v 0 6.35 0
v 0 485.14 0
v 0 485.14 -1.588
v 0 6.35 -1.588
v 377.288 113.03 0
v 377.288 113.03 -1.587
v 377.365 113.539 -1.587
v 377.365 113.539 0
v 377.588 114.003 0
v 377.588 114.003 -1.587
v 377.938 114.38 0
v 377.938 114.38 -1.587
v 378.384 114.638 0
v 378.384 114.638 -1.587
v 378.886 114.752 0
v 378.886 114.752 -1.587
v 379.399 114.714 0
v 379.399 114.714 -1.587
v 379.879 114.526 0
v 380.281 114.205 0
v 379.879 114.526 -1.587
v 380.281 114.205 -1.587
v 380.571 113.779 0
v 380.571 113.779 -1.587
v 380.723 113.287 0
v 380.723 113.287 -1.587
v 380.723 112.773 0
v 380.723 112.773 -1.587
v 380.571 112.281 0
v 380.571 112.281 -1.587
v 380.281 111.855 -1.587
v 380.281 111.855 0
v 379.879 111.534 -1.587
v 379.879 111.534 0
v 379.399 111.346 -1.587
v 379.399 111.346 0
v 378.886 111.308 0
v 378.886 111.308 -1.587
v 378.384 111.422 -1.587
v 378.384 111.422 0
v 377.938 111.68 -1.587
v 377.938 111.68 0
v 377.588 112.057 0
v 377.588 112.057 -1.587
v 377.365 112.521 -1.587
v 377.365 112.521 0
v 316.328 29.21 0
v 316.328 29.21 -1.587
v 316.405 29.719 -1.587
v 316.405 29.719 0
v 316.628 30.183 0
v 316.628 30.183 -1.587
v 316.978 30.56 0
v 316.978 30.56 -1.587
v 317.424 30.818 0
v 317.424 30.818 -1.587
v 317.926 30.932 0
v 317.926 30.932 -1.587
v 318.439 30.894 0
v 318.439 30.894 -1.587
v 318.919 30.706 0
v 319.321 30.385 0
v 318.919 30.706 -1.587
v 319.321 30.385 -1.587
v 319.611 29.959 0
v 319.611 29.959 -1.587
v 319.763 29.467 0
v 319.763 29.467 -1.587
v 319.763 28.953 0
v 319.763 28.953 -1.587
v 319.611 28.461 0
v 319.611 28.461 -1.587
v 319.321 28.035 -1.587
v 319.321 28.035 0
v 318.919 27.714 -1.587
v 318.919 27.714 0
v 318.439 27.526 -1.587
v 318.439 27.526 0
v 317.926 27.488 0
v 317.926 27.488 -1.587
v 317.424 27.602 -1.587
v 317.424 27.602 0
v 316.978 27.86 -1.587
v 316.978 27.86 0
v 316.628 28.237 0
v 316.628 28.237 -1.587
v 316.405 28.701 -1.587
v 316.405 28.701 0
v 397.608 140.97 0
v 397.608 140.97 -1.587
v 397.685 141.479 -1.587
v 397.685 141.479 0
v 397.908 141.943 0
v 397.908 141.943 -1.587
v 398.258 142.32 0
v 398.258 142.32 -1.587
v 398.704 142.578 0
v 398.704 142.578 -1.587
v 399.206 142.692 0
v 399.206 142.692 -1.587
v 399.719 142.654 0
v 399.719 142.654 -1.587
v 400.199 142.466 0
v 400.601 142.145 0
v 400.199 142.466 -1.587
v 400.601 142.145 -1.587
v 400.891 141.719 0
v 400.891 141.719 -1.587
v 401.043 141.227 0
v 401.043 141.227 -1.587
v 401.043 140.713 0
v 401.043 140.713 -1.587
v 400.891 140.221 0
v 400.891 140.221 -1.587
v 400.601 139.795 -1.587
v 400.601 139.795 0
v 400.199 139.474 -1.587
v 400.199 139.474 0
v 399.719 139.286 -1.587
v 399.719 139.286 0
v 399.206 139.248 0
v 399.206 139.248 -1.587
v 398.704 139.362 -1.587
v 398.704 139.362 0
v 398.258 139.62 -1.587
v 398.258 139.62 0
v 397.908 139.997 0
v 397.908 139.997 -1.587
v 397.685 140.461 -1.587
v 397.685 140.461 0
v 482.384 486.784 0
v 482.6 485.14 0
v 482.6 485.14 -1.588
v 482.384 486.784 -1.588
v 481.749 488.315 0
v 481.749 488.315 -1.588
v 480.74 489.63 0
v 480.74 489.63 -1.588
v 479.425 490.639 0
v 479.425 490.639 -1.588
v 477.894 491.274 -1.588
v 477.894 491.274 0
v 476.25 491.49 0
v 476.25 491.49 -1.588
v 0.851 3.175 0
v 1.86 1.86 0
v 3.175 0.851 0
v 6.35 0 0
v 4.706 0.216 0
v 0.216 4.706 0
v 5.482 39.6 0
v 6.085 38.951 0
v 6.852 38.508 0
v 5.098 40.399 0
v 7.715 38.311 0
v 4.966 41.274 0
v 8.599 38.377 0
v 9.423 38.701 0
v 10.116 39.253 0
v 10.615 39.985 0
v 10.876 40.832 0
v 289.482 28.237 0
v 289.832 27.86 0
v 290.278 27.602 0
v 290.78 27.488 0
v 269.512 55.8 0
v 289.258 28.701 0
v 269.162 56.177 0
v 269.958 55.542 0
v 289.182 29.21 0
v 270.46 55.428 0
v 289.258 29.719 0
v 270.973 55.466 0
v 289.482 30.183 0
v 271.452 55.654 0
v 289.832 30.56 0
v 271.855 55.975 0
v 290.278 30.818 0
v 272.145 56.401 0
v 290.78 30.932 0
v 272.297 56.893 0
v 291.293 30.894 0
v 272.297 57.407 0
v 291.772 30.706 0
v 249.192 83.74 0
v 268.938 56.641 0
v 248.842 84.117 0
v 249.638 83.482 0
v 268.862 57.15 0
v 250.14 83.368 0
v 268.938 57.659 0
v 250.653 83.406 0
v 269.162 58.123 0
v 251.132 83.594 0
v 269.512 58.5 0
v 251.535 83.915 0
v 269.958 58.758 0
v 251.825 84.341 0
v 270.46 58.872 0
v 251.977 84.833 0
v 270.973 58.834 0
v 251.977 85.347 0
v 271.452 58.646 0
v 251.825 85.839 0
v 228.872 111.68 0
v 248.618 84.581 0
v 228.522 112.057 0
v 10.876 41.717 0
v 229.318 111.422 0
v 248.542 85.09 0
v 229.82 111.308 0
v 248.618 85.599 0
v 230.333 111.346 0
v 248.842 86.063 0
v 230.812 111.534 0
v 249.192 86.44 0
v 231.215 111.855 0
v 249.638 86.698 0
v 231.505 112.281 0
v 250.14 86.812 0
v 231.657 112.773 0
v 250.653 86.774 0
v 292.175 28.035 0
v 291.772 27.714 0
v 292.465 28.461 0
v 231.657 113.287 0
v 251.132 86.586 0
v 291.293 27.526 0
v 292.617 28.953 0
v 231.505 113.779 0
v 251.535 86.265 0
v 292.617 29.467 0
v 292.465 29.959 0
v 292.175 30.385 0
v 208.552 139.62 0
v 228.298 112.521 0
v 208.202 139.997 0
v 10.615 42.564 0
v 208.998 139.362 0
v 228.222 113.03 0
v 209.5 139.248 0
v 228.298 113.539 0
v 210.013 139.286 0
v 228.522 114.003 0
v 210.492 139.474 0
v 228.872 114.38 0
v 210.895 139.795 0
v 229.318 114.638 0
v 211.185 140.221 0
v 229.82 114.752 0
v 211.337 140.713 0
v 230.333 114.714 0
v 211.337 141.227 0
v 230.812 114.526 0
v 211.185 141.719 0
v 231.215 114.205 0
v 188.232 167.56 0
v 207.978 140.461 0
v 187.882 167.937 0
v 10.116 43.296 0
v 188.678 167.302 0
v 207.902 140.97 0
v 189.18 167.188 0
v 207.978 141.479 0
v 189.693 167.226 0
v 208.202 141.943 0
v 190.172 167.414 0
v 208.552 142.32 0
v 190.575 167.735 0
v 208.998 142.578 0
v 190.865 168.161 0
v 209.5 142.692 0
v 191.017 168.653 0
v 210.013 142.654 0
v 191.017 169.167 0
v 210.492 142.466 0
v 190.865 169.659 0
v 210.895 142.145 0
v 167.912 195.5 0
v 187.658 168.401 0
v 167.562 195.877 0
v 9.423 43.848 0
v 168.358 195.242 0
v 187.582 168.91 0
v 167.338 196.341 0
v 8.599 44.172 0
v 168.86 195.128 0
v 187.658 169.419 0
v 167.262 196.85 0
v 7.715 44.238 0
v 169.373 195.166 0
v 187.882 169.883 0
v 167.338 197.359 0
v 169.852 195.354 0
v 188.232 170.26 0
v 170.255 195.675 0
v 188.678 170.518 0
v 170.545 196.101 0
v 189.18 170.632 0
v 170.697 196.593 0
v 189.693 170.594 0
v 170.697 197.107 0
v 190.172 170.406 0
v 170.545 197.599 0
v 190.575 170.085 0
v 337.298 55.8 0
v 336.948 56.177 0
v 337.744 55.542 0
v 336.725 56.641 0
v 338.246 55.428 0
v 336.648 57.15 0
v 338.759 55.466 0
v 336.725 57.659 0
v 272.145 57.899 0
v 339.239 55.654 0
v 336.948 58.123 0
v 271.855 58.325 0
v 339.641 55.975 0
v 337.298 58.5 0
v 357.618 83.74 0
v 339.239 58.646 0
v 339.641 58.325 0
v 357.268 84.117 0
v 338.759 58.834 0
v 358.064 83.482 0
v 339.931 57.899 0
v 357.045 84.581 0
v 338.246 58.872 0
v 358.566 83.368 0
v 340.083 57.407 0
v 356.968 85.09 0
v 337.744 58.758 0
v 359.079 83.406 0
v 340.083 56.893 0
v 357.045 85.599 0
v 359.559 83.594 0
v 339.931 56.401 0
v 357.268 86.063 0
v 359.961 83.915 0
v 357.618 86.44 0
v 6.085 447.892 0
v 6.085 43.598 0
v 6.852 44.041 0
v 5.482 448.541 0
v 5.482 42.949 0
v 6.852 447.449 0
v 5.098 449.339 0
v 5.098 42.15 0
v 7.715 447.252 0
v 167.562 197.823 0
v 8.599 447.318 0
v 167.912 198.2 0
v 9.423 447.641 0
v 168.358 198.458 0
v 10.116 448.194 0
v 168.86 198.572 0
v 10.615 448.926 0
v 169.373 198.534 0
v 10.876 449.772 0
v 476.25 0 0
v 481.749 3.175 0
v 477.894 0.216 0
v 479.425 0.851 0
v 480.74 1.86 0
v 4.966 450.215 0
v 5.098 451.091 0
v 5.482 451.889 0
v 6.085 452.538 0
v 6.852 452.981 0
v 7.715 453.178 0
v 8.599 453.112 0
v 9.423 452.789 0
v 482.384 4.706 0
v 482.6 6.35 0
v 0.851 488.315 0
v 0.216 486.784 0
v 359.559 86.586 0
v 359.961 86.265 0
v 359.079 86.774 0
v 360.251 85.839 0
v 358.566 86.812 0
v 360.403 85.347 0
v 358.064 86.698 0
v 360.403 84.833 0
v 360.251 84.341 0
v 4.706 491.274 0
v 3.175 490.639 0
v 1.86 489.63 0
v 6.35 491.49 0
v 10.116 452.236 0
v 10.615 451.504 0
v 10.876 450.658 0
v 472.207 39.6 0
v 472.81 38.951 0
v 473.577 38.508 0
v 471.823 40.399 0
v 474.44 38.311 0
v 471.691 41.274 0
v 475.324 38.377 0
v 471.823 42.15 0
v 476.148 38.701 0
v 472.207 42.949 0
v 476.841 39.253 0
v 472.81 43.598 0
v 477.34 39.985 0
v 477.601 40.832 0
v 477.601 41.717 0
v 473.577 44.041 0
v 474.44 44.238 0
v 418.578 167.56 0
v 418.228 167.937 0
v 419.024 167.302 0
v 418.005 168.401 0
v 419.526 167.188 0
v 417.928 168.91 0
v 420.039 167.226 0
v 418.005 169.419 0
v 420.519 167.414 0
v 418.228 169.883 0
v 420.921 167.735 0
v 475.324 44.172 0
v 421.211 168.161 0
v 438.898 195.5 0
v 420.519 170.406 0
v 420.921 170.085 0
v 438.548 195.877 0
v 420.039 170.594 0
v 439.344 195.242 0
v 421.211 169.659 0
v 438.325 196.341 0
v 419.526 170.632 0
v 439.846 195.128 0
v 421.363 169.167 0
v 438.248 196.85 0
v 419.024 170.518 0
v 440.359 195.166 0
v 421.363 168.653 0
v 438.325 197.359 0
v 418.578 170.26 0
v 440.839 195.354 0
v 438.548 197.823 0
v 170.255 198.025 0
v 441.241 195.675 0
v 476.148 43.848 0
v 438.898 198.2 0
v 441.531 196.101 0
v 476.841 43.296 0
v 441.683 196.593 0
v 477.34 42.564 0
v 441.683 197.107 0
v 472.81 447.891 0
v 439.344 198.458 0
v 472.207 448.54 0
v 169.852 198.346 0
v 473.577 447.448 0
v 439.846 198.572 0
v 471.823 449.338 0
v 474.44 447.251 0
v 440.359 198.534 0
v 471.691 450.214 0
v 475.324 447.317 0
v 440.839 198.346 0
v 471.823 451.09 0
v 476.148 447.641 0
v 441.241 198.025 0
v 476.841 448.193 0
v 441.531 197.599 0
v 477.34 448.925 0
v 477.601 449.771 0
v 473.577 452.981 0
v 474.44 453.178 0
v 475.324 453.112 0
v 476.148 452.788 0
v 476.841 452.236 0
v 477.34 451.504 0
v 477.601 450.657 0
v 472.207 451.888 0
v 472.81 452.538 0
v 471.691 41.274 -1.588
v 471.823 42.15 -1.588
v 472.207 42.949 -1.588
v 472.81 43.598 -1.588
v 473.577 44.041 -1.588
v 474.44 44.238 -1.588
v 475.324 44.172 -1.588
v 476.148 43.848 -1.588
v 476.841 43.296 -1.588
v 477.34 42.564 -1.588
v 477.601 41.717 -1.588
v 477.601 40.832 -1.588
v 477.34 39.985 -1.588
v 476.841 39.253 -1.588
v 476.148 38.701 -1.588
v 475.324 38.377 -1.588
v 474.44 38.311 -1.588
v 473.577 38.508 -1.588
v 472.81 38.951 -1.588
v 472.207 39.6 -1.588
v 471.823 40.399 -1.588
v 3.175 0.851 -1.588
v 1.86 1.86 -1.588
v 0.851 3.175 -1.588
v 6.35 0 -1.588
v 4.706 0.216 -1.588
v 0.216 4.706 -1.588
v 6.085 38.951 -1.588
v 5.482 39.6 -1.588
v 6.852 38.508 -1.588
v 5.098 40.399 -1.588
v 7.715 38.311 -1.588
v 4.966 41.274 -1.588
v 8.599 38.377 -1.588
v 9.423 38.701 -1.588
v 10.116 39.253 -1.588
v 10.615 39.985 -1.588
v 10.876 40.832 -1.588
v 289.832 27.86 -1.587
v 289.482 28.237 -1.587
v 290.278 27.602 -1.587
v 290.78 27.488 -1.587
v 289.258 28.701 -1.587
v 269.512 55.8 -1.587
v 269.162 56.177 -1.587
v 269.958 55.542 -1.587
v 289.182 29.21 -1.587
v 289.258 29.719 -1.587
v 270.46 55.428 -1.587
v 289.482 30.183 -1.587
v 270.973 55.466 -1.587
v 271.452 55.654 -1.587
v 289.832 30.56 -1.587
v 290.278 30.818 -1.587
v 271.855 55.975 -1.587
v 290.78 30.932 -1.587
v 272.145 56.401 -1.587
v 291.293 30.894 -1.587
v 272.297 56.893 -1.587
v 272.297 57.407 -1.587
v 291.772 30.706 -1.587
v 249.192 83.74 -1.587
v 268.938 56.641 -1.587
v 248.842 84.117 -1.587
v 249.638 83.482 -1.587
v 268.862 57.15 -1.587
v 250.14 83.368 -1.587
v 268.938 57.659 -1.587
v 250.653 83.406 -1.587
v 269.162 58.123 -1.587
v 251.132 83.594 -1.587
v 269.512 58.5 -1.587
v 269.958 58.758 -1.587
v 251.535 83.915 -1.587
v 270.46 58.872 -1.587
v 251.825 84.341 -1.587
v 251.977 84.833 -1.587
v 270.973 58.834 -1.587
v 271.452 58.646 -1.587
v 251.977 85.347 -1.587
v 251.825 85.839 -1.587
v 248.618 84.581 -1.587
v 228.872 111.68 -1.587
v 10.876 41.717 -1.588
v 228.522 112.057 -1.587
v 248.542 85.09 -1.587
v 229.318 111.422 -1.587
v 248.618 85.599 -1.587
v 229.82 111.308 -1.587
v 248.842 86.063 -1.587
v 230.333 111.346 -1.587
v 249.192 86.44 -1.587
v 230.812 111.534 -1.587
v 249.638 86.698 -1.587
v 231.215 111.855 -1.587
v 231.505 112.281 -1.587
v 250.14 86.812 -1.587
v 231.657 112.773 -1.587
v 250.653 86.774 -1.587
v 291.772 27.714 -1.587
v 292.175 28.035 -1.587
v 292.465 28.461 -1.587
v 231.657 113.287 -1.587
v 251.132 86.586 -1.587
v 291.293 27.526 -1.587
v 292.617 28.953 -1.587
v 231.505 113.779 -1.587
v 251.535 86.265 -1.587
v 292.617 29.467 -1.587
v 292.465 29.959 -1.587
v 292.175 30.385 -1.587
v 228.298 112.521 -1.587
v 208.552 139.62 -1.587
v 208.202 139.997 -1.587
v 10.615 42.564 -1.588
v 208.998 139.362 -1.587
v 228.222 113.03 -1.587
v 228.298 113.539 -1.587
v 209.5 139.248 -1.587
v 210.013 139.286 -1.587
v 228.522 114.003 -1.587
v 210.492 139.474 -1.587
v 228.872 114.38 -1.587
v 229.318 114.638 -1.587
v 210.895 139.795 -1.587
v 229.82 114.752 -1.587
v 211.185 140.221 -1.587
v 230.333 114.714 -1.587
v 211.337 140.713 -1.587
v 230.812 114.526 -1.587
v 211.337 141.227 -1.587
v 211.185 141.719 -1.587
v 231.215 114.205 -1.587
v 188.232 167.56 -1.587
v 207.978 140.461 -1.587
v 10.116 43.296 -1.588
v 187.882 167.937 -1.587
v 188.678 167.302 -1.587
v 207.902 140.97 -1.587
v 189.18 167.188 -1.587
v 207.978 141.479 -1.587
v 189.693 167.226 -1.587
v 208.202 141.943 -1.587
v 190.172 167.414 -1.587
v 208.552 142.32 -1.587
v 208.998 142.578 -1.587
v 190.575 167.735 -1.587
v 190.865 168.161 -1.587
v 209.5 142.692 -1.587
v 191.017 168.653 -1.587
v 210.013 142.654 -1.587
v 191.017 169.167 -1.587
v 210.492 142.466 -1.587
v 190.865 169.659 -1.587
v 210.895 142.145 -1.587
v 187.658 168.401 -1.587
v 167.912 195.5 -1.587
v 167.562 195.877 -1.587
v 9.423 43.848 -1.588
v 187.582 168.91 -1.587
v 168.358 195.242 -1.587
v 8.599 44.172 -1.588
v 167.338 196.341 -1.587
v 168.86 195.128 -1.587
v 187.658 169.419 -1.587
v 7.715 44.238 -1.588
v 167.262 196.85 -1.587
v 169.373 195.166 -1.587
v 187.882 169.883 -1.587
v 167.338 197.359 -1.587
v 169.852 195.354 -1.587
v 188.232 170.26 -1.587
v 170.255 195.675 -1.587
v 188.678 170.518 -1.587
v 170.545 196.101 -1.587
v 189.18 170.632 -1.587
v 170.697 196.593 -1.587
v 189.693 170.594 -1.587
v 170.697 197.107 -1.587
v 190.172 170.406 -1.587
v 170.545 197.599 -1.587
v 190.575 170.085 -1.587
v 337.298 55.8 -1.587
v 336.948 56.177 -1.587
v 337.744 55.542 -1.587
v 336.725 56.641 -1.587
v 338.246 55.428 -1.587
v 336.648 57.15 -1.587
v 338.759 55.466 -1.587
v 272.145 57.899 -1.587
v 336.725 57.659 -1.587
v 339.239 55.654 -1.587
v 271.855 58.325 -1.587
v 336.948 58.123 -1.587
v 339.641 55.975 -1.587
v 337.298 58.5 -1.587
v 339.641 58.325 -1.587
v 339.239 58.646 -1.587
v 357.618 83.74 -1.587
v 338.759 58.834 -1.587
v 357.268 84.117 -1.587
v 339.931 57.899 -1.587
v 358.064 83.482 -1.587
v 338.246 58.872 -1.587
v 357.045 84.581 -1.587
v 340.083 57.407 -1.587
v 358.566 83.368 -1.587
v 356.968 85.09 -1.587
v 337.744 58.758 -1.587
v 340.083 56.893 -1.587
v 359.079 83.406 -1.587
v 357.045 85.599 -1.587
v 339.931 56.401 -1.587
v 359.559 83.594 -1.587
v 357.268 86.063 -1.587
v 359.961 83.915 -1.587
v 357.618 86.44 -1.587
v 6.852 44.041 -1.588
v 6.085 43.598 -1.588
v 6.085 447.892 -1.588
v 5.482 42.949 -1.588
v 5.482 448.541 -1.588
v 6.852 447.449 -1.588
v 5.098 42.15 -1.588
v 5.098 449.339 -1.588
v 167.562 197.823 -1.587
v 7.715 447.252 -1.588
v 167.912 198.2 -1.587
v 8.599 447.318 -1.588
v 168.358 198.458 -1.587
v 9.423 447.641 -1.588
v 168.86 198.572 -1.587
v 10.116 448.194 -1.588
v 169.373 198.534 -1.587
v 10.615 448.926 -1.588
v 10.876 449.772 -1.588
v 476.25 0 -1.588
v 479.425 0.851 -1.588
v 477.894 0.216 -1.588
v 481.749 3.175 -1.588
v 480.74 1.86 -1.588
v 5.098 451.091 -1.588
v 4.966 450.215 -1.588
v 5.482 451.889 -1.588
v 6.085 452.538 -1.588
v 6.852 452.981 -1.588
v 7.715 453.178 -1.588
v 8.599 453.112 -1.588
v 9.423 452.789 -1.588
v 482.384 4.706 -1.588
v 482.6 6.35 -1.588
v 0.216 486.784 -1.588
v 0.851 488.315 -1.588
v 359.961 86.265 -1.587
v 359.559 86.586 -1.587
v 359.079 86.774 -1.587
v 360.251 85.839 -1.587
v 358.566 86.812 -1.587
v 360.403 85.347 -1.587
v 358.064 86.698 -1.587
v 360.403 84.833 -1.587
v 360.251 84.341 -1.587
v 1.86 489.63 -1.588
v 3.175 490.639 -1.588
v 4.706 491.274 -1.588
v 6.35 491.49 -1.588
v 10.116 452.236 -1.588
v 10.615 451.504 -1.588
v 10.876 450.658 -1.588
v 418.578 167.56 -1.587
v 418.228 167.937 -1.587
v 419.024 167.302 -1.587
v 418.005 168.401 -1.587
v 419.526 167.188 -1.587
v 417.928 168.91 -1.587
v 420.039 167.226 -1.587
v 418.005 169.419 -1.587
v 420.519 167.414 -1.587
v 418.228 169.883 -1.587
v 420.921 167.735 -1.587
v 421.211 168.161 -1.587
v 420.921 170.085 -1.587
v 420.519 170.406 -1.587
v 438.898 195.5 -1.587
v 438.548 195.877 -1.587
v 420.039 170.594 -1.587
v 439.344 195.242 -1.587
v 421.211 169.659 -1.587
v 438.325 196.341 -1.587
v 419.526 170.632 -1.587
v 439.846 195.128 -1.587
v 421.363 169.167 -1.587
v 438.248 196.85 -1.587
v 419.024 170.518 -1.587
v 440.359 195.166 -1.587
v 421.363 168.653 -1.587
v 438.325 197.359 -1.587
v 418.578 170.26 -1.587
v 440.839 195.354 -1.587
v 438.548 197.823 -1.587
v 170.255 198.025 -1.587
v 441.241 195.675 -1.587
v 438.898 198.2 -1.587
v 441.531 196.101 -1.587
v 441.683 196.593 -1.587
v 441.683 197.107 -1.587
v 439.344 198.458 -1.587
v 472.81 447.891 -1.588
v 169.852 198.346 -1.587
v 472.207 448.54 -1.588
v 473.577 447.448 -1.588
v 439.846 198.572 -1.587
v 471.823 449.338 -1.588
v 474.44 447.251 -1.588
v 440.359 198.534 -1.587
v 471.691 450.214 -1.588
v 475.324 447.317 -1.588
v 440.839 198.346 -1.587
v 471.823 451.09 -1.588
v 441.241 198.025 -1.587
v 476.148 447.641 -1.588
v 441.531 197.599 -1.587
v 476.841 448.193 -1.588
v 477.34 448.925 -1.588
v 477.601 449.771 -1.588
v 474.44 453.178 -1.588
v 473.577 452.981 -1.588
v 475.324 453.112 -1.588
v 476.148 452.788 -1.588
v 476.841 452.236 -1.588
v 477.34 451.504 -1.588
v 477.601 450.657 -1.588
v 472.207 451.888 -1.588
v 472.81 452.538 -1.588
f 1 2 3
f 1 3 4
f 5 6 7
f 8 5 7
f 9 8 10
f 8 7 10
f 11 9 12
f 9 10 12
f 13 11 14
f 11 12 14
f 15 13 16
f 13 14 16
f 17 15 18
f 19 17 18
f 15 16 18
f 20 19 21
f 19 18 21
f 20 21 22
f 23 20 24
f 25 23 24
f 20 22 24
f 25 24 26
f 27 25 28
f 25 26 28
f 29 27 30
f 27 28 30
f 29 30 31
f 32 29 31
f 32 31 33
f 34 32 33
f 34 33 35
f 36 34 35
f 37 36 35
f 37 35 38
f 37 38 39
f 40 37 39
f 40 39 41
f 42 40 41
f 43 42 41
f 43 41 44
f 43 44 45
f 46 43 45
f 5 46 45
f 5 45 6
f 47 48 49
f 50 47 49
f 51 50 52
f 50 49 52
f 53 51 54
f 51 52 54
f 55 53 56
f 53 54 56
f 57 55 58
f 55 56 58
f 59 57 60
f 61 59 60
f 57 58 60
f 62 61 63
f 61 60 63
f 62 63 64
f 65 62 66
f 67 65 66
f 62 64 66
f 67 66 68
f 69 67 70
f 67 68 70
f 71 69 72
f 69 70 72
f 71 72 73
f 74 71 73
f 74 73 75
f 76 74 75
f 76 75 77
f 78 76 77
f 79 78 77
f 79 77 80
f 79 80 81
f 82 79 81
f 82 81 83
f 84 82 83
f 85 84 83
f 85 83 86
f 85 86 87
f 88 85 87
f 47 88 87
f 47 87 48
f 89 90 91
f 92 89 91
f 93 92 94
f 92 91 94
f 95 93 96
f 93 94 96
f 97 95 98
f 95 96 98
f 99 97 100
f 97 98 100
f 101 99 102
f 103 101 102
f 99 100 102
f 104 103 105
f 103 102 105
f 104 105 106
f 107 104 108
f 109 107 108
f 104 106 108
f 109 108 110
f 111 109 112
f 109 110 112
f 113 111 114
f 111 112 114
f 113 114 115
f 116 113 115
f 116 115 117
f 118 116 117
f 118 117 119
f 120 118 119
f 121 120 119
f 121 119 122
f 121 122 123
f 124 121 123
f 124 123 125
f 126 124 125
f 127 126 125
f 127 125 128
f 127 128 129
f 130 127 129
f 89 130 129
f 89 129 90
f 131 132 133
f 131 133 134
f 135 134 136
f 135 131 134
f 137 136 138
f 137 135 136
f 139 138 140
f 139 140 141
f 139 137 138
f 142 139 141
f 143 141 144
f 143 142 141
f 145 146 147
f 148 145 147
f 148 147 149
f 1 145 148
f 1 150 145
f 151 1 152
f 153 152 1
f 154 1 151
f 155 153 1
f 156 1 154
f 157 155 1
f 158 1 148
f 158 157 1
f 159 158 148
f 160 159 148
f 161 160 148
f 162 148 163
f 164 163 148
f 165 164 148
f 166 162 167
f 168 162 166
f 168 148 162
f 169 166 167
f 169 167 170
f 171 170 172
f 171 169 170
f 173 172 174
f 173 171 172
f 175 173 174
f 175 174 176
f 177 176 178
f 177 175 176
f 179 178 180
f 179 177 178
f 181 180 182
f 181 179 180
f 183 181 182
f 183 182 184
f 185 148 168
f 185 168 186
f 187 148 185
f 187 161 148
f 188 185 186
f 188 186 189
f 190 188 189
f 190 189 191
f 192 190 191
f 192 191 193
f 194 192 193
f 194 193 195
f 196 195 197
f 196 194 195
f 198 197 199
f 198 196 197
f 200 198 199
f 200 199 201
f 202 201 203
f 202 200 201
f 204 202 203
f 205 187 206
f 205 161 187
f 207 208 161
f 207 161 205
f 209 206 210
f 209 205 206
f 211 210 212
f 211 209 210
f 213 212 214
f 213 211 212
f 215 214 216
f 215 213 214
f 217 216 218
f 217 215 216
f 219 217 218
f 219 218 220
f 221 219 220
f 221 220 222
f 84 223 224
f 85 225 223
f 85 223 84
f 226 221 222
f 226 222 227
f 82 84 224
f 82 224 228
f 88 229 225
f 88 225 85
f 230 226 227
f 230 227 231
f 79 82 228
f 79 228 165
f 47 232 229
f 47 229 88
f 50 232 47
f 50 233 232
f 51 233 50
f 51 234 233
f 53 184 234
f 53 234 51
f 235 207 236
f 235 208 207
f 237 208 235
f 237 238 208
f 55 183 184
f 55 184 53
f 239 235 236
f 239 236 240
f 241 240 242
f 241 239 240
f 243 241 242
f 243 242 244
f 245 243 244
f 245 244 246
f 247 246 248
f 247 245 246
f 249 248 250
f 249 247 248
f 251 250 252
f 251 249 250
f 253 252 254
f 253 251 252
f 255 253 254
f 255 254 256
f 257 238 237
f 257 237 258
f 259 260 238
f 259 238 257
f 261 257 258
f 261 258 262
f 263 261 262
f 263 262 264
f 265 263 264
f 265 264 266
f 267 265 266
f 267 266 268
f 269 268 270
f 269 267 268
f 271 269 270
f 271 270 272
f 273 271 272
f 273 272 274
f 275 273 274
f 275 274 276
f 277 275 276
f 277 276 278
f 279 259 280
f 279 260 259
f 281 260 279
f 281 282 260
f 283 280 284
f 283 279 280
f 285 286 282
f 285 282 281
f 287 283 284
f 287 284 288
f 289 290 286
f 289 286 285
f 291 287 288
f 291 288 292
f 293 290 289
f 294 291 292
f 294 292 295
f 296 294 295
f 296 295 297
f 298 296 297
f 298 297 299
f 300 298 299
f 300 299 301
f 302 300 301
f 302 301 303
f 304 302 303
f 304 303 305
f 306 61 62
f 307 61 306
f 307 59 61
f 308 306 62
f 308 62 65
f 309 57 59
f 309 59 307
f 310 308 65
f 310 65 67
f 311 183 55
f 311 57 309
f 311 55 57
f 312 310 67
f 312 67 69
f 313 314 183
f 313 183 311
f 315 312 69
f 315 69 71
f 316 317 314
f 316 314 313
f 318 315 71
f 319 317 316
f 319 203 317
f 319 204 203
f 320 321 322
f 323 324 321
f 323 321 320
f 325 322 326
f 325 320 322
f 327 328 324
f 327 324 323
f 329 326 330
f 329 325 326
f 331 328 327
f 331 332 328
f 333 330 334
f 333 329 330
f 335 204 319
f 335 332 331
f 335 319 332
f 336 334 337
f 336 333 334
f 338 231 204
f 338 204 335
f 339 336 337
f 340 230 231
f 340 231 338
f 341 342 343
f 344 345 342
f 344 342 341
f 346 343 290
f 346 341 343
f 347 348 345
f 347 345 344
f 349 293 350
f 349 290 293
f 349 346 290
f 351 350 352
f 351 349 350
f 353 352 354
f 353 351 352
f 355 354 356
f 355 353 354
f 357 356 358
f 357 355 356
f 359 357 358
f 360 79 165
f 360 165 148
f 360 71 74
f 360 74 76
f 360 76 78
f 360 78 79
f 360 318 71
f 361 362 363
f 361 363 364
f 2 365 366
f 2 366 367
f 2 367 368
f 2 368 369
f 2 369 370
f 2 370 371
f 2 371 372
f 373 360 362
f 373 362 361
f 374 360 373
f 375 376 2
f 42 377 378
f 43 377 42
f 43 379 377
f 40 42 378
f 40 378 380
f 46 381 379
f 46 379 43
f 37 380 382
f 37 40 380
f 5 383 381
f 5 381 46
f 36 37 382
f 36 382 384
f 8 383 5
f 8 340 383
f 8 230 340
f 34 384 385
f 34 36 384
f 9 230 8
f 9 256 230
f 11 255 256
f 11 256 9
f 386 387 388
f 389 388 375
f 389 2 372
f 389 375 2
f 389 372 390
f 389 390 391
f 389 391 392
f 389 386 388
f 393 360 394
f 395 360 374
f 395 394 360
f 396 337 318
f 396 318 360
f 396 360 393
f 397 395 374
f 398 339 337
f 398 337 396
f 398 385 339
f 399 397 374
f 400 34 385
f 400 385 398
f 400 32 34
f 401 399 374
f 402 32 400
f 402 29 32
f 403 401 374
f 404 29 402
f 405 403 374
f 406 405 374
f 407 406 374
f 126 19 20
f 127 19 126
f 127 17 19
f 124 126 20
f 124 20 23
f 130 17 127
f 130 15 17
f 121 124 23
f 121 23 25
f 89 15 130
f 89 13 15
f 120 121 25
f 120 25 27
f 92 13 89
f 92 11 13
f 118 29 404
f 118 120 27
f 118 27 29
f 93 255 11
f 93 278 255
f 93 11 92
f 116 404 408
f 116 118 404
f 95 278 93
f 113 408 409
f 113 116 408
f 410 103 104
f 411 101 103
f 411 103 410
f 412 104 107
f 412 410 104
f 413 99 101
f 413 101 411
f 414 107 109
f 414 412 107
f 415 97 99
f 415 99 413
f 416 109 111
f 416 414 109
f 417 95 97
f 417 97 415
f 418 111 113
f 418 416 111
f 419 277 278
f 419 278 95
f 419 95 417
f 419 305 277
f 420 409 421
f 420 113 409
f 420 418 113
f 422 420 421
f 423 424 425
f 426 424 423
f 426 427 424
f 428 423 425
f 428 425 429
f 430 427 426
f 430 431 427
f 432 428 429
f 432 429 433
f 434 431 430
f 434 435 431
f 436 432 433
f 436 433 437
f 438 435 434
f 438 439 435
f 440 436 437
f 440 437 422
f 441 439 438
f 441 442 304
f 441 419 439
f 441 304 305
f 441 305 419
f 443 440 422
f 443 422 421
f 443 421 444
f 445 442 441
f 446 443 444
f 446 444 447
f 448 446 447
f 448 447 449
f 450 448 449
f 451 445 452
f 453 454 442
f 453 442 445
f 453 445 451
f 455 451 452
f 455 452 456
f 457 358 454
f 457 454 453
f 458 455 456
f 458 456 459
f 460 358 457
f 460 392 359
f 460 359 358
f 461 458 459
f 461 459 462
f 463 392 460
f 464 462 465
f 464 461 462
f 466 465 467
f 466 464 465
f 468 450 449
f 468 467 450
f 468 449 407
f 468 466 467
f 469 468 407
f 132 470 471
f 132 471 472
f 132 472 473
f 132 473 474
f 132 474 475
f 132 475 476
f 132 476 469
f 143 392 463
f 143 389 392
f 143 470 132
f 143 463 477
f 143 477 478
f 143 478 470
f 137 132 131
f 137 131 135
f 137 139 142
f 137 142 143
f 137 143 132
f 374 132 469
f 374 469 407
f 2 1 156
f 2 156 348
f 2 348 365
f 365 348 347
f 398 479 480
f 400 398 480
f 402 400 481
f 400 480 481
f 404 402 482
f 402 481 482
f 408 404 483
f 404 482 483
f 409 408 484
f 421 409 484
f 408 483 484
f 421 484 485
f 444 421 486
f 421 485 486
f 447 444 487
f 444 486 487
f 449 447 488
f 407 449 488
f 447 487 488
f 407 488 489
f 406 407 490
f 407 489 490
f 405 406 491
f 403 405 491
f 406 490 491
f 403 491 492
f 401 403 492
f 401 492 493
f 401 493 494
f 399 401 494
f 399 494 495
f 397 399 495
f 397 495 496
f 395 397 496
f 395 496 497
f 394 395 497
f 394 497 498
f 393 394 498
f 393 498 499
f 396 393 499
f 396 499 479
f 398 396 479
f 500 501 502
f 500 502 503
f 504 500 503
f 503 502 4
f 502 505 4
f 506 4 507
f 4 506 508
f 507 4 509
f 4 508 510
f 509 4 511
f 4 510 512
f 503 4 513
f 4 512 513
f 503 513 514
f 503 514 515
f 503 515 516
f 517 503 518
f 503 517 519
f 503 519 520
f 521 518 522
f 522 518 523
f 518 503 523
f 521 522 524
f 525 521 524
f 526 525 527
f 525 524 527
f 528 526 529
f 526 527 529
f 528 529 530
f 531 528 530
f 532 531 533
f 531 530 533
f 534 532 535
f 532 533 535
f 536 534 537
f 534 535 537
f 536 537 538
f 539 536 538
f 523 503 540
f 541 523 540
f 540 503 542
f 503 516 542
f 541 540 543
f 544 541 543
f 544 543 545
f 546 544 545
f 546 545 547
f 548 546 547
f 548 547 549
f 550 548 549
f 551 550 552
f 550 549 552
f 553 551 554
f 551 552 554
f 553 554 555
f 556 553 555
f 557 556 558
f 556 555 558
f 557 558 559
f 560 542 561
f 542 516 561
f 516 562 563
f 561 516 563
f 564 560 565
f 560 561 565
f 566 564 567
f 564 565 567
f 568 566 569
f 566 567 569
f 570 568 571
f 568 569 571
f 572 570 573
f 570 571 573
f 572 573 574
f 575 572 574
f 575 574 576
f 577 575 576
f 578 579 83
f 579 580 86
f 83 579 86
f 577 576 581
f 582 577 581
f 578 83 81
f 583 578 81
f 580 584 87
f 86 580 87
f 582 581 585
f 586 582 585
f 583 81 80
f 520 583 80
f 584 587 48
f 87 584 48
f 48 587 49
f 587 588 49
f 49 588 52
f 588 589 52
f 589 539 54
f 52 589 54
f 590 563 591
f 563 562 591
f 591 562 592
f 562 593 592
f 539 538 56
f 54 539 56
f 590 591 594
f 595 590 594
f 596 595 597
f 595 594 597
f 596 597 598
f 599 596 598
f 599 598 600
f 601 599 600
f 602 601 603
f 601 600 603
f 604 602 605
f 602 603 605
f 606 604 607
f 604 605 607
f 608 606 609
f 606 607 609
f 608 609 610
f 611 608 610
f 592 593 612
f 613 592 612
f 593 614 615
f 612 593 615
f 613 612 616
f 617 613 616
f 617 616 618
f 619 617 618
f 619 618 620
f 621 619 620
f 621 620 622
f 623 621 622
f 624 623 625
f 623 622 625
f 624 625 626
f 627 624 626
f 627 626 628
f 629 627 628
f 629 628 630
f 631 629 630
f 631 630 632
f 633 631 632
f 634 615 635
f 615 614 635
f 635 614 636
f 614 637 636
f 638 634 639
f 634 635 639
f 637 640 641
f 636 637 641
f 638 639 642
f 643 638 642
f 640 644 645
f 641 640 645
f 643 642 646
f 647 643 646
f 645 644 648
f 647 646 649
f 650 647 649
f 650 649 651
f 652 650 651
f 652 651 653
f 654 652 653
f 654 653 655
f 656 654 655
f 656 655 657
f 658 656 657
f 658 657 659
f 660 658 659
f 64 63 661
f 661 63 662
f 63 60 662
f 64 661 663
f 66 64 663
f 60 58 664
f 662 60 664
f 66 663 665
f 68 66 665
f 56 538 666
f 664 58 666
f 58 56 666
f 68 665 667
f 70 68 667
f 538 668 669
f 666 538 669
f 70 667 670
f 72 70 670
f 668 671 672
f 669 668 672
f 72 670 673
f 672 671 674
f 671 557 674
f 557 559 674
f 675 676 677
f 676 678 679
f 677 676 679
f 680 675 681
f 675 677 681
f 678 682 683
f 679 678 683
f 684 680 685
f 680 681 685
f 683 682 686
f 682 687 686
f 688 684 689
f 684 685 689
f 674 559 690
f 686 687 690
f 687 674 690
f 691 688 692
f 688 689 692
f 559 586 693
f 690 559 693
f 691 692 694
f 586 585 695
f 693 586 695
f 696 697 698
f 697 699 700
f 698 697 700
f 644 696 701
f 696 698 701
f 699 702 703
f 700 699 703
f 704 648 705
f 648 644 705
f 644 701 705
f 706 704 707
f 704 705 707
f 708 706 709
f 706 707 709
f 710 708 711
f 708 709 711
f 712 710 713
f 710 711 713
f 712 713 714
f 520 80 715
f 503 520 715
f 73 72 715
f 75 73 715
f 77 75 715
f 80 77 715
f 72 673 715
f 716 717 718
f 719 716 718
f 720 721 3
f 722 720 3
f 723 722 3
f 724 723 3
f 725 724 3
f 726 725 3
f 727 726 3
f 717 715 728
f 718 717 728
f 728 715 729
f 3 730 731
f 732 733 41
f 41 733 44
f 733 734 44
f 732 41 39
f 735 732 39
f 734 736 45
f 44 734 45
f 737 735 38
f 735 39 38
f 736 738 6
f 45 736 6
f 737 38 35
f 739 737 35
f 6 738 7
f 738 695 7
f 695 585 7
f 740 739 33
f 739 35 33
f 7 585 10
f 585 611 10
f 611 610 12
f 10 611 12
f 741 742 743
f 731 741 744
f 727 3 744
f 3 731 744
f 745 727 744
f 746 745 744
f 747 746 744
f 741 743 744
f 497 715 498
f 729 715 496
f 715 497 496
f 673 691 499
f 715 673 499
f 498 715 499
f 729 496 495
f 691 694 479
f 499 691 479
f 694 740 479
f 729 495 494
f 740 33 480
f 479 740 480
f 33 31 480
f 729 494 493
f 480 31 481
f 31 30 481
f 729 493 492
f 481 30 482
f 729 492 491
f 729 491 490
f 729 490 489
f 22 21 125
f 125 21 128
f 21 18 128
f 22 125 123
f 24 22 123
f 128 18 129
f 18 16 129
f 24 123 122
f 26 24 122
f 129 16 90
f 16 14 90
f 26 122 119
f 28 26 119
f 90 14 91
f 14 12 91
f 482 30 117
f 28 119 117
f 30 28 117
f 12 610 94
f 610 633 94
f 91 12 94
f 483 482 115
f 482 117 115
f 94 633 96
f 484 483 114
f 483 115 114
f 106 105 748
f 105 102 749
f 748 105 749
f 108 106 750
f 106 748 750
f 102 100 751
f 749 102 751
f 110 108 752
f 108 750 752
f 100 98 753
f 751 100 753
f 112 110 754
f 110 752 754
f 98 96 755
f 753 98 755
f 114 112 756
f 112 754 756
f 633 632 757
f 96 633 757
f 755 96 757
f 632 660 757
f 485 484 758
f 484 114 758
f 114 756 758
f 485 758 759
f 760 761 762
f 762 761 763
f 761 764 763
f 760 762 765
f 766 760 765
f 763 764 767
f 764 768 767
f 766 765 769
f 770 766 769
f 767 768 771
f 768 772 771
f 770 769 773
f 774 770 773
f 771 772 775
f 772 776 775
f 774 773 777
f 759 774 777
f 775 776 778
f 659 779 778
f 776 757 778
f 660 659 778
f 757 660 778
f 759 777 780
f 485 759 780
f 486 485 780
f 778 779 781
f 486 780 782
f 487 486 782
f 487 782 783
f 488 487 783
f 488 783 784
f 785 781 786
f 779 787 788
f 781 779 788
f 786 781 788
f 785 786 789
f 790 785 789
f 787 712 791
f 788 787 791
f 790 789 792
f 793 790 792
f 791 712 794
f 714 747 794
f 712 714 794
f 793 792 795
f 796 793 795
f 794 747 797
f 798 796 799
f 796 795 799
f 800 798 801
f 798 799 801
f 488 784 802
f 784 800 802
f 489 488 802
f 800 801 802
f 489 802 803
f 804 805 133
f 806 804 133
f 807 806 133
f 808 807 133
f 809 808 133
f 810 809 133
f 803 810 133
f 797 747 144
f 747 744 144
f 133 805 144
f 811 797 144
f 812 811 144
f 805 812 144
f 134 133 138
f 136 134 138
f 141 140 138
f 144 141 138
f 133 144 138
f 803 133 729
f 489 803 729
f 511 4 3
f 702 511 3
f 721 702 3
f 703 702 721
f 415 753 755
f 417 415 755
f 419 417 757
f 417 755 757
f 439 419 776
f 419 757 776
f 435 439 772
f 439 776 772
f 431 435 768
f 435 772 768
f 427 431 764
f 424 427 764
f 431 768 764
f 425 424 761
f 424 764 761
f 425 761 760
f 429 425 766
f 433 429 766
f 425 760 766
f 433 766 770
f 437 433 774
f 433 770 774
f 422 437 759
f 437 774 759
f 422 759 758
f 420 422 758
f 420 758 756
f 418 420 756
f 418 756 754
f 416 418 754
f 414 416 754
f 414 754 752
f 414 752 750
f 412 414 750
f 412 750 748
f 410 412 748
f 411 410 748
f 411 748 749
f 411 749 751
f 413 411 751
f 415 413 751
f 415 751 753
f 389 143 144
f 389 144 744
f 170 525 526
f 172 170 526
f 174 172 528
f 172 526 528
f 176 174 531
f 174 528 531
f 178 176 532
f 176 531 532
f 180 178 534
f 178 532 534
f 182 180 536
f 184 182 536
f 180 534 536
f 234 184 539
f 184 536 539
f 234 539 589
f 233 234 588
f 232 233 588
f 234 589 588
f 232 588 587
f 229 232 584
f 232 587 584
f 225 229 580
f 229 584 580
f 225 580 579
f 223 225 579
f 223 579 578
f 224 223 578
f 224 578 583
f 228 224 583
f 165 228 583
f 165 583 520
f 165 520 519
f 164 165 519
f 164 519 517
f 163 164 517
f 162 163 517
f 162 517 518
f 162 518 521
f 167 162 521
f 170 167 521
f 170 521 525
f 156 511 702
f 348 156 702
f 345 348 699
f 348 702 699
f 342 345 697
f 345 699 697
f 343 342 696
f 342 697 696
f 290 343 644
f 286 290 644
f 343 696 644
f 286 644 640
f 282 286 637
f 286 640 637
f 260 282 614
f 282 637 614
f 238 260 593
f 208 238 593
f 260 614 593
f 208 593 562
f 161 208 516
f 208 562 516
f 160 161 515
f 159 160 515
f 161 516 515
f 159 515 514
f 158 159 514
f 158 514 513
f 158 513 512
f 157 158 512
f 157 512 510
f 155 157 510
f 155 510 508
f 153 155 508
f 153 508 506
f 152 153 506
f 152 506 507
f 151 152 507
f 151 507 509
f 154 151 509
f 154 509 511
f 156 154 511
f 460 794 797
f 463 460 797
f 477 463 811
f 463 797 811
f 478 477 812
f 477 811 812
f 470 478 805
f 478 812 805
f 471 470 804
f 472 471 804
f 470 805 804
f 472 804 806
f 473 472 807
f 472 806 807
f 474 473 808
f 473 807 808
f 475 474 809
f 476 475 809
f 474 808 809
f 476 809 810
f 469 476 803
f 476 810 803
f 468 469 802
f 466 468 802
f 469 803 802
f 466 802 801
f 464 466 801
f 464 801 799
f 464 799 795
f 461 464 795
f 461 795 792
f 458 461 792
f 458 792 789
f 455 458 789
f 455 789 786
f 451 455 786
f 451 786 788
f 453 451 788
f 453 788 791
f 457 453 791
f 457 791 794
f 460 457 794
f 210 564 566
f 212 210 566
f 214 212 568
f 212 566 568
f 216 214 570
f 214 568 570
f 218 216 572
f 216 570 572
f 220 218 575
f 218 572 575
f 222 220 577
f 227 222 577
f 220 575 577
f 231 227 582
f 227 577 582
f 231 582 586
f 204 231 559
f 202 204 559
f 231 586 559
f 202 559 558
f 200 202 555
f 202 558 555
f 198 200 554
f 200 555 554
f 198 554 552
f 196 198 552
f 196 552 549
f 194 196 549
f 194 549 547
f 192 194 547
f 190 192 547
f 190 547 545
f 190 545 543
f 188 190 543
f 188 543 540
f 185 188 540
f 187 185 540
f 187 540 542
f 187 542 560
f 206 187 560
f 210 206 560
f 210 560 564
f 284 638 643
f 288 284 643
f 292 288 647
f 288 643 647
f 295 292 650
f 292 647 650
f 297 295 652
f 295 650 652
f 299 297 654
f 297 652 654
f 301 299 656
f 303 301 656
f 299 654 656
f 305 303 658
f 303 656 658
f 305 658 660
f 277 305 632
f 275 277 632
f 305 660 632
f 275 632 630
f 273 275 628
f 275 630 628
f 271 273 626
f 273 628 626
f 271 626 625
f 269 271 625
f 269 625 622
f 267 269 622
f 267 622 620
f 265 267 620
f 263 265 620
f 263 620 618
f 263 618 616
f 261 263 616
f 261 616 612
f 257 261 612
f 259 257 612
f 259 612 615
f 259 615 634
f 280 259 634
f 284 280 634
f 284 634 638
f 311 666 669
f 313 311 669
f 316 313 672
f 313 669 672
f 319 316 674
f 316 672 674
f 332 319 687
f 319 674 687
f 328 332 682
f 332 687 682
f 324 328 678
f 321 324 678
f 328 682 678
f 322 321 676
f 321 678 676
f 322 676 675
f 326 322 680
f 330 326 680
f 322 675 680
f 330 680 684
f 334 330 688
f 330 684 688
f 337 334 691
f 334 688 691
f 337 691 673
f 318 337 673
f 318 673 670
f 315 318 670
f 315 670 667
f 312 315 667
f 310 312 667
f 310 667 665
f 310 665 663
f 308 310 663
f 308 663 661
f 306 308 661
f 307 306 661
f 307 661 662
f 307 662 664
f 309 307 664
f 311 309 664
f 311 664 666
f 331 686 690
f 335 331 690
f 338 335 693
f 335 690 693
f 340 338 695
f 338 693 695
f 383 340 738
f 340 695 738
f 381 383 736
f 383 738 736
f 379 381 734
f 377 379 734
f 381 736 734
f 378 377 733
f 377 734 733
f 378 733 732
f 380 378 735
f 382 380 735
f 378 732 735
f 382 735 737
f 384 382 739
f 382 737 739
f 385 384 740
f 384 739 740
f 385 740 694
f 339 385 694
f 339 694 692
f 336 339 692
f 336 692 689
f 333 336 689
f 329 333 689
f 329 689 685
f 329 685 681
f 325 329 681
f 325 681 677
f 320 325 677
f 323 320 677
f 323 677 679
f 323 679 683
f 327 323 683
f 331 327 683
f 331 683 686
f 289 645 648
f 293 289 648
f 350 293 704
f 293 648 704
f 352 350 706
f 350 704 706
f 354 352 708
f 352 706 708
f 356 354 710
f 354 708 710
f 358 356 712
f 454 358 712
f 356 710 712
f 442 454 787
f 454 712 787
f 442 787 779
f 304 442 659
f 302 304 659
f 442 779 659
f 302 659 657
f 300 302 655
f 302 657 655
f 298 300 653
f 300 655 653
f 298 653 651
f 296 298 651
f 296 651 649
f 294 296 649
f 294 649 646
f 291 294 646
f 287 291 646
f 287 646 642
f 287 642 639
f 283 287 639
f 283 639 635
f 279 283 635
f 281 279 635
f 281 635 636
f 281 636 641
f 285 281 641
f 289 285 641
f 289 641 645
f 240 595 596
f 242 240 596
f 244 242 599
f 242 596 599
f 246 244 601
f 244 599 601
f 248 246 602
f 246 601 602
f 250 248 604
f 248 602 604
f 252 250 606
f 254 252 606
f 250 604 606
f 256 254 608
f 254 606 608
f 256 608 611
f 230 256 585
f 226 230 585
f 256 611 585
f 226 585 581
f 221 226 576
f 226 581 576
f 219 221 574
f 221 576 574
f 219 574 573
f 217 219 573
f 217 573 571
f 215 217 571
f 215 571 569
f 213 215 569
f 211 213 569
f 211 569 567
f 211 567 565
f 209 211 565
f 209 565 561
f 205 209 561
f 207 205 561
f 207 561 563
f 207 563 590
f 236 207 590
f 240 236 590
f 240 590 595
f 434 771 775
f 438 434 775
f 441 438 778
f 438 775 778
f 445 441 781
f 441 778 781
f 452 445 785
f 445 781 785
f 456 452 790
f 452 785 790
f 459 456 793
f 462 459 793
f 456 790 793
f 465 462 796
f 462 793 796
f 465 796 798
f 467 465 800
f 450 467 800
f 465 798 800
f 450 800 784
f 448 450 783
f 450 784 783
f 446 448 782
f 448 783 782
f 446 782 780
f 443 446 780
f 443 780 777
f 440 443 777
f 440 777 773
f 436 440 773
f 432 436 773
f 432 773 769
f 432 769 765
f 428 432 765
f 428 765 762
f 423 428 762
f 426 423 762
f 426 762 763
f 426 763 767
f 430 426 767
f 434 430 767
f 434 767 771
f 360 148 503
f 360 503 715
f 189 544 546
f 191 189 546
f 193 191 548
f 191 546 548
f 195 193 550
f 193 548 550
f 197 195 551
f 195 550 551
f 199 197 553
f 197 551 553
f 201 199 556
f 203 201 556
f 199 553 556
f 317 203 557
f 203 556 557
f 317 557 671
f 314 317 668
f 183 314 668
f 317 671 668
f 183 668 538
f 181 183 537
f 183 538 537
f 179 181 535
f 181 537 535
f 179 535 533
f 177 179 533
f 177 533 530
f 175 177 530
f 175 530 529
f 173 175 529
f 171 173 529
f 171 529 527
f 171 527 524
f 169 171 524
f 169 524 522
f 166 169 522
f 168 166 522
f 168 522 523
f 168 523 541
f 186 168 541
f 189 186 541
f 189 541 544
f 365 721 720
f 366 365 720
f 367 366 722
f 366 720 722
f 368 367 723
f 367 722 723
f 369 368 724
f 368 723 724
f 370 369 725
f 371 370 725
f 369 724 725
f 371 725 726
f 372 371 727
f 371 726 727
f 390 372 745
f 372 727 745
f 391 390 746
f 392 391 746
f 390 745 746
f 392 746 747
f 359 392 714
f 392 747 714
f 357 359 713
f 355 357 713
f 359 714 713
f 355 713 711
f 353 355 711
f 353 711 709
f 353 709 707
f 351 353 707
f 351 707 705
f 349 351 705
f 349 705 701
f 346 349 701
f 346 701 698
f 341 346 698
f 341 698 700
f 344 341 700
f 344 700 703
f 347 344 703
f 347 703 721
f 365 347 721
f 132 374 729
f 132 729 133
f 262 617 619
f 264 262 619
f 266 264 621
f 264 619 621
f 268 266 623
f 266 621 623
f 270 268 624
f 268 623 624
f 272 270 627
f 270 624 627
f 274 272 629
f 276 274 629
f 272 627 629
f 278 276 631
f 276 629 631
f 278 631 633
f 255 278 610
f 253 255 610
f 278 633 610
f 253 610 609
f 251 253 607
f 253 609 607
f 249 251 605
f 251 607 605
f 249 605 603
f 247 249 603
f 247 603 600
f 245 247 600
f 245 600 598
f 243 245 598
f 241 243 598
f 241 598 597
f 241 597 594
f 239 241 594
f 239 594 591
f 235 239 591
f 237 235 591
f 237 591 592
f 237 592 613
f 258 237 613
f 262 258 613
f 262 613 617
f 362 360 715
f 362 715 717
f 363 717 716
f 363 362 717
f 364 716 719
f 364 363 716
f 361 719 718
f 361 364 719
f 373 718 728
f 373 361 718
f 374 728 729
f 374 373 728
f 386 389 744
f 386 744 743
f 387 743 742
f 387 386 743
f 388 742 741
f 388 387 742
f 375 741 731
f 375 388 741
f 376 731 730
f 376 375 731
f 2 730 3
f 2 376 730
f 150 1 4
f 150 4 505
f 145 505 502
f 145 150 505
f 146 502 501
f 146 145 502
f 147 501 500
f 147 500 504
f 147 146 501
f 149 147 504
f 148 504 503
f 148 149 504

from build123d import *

# Parameters (mm, degrees)
BOSS_EXTRUDE1_DEPTH             = 1.5875
A_0_234_DIAMETER_HOLE1_D        = 5.9436
A_0_234_DIAMETER_HOLE1_DEPTH    = 6.35
A_0_234_DIAMETER_HOLE1_TIP      = 1.785637588
F_29_0_136_DIAMETER_HOLE1_D     = 3.4544
F_29_0_136_DIAMETER_HOLE1_DEPTH = 19.05
F_29_0_136_DIAMETER_HOLE1_TIP   = 1.037806461


with BuildPart() as part:
    # Sketch1 → Boss-Extrude1 (new body)
    with BuildSketch(Plane.XY):
        with BuildLine():
            Line((6.35, 0), (476.25, 0))
            ThreePointArc((476.25, 0), (480.740128061, 1.859871939), (482.6, 6.35))
            Line((482.6, 6.35), (482.6, 485.14))
            ThreePointArc((482.6, 485.14), (480.740128061, 489.630128061), (476.25, 491.49))
            Line((476.25, 491.49), (6.35, 491.49))
            ThreePointArc((6.35, 491.49), (1.859871939, 489.630128061), (0, 485.14))
            Line((0, 485.14), (0, 6.35))
            ThreePointArc((0, 6.35), (1.859871939, 1.859871939), (6.35, 0))
        make_face()
    extrude(amount=-BOSS_EXTRUDE1_DEPTH)

    # A (0.234) Diameter Hole1
    with Locations(Plane(origin=(-396.999136144, -1211.173521534, 0), x_dir=(1, 0, 0), z_dir=(0, 0, 1))):
        with Locations((871.661631208, 1252.447991883), (871.661636144, 1661.387931308), (404.936636144, 1661.388521534), (404.936631208, 1252.447991883)):
            Hole(A_0_234_DIAMETER_HOLE1_D / 2, depth=A_0_234_DIAMETER_HOLE1_DEPTH)
            with Locations((0, 0, -(A_0_234_DIAMETER_HOLE1_DEPTH + A_0_234_DIAMETER_HOLE1_TIP / 2))):  # 118° drill point
                Cone(0, A_0_234_DIAMETER_HOLE1_D / 2, A_0_234_DIAMETER_HOLE1_TIP, mode=Mode.SUBTRACT)

    # #29 (0.136) Diameter Hole1
    with Locations(Plane(origin=(-437.078957849, -1254.719045707, 0), x_dir=(1, 0, 0), z_dir=(0, 0, 1))):
        with Locations((606.067697849, 1451.569045707), (626.387697849, 1423.629045707), (646.707697849, 1395.689045707), (667.027697849, 1367.749045707), (687.347697849, 1339.809045707), (707.667697849, 1311.869045707), (727.987697849, 1283.929045707), (755.133947849, 1283.929045707), (775.453947849, 1311.869045707), (795.773947849, 1339.809045707), (816.093947849, 1367.749045707), (877.053947849, 1451.569045707), (856.733947849, 1423.629045707), (836.413947849, 1395.689045707)):
            Hole(F_29_0_136_DIAMETER_HOLE1_D / 2, depth=F_29_0_136_DIAMETER_HOLE1_DEPTH)
            with Locations((0, 0, -(F_29_0_136_DIAMETER_HOLE1_DEPTH + F_29_0_136_DIAMETER_HOLE1_TIP / 2))):  # 118° drill point
                Cone(0, F_29_0_136_DIAMETER_HOLE1_D / 2, F_29_0_136_DIAMETER_HOLE1_TIP, mode=Mode.SUBTRACT)


solid = part.part
